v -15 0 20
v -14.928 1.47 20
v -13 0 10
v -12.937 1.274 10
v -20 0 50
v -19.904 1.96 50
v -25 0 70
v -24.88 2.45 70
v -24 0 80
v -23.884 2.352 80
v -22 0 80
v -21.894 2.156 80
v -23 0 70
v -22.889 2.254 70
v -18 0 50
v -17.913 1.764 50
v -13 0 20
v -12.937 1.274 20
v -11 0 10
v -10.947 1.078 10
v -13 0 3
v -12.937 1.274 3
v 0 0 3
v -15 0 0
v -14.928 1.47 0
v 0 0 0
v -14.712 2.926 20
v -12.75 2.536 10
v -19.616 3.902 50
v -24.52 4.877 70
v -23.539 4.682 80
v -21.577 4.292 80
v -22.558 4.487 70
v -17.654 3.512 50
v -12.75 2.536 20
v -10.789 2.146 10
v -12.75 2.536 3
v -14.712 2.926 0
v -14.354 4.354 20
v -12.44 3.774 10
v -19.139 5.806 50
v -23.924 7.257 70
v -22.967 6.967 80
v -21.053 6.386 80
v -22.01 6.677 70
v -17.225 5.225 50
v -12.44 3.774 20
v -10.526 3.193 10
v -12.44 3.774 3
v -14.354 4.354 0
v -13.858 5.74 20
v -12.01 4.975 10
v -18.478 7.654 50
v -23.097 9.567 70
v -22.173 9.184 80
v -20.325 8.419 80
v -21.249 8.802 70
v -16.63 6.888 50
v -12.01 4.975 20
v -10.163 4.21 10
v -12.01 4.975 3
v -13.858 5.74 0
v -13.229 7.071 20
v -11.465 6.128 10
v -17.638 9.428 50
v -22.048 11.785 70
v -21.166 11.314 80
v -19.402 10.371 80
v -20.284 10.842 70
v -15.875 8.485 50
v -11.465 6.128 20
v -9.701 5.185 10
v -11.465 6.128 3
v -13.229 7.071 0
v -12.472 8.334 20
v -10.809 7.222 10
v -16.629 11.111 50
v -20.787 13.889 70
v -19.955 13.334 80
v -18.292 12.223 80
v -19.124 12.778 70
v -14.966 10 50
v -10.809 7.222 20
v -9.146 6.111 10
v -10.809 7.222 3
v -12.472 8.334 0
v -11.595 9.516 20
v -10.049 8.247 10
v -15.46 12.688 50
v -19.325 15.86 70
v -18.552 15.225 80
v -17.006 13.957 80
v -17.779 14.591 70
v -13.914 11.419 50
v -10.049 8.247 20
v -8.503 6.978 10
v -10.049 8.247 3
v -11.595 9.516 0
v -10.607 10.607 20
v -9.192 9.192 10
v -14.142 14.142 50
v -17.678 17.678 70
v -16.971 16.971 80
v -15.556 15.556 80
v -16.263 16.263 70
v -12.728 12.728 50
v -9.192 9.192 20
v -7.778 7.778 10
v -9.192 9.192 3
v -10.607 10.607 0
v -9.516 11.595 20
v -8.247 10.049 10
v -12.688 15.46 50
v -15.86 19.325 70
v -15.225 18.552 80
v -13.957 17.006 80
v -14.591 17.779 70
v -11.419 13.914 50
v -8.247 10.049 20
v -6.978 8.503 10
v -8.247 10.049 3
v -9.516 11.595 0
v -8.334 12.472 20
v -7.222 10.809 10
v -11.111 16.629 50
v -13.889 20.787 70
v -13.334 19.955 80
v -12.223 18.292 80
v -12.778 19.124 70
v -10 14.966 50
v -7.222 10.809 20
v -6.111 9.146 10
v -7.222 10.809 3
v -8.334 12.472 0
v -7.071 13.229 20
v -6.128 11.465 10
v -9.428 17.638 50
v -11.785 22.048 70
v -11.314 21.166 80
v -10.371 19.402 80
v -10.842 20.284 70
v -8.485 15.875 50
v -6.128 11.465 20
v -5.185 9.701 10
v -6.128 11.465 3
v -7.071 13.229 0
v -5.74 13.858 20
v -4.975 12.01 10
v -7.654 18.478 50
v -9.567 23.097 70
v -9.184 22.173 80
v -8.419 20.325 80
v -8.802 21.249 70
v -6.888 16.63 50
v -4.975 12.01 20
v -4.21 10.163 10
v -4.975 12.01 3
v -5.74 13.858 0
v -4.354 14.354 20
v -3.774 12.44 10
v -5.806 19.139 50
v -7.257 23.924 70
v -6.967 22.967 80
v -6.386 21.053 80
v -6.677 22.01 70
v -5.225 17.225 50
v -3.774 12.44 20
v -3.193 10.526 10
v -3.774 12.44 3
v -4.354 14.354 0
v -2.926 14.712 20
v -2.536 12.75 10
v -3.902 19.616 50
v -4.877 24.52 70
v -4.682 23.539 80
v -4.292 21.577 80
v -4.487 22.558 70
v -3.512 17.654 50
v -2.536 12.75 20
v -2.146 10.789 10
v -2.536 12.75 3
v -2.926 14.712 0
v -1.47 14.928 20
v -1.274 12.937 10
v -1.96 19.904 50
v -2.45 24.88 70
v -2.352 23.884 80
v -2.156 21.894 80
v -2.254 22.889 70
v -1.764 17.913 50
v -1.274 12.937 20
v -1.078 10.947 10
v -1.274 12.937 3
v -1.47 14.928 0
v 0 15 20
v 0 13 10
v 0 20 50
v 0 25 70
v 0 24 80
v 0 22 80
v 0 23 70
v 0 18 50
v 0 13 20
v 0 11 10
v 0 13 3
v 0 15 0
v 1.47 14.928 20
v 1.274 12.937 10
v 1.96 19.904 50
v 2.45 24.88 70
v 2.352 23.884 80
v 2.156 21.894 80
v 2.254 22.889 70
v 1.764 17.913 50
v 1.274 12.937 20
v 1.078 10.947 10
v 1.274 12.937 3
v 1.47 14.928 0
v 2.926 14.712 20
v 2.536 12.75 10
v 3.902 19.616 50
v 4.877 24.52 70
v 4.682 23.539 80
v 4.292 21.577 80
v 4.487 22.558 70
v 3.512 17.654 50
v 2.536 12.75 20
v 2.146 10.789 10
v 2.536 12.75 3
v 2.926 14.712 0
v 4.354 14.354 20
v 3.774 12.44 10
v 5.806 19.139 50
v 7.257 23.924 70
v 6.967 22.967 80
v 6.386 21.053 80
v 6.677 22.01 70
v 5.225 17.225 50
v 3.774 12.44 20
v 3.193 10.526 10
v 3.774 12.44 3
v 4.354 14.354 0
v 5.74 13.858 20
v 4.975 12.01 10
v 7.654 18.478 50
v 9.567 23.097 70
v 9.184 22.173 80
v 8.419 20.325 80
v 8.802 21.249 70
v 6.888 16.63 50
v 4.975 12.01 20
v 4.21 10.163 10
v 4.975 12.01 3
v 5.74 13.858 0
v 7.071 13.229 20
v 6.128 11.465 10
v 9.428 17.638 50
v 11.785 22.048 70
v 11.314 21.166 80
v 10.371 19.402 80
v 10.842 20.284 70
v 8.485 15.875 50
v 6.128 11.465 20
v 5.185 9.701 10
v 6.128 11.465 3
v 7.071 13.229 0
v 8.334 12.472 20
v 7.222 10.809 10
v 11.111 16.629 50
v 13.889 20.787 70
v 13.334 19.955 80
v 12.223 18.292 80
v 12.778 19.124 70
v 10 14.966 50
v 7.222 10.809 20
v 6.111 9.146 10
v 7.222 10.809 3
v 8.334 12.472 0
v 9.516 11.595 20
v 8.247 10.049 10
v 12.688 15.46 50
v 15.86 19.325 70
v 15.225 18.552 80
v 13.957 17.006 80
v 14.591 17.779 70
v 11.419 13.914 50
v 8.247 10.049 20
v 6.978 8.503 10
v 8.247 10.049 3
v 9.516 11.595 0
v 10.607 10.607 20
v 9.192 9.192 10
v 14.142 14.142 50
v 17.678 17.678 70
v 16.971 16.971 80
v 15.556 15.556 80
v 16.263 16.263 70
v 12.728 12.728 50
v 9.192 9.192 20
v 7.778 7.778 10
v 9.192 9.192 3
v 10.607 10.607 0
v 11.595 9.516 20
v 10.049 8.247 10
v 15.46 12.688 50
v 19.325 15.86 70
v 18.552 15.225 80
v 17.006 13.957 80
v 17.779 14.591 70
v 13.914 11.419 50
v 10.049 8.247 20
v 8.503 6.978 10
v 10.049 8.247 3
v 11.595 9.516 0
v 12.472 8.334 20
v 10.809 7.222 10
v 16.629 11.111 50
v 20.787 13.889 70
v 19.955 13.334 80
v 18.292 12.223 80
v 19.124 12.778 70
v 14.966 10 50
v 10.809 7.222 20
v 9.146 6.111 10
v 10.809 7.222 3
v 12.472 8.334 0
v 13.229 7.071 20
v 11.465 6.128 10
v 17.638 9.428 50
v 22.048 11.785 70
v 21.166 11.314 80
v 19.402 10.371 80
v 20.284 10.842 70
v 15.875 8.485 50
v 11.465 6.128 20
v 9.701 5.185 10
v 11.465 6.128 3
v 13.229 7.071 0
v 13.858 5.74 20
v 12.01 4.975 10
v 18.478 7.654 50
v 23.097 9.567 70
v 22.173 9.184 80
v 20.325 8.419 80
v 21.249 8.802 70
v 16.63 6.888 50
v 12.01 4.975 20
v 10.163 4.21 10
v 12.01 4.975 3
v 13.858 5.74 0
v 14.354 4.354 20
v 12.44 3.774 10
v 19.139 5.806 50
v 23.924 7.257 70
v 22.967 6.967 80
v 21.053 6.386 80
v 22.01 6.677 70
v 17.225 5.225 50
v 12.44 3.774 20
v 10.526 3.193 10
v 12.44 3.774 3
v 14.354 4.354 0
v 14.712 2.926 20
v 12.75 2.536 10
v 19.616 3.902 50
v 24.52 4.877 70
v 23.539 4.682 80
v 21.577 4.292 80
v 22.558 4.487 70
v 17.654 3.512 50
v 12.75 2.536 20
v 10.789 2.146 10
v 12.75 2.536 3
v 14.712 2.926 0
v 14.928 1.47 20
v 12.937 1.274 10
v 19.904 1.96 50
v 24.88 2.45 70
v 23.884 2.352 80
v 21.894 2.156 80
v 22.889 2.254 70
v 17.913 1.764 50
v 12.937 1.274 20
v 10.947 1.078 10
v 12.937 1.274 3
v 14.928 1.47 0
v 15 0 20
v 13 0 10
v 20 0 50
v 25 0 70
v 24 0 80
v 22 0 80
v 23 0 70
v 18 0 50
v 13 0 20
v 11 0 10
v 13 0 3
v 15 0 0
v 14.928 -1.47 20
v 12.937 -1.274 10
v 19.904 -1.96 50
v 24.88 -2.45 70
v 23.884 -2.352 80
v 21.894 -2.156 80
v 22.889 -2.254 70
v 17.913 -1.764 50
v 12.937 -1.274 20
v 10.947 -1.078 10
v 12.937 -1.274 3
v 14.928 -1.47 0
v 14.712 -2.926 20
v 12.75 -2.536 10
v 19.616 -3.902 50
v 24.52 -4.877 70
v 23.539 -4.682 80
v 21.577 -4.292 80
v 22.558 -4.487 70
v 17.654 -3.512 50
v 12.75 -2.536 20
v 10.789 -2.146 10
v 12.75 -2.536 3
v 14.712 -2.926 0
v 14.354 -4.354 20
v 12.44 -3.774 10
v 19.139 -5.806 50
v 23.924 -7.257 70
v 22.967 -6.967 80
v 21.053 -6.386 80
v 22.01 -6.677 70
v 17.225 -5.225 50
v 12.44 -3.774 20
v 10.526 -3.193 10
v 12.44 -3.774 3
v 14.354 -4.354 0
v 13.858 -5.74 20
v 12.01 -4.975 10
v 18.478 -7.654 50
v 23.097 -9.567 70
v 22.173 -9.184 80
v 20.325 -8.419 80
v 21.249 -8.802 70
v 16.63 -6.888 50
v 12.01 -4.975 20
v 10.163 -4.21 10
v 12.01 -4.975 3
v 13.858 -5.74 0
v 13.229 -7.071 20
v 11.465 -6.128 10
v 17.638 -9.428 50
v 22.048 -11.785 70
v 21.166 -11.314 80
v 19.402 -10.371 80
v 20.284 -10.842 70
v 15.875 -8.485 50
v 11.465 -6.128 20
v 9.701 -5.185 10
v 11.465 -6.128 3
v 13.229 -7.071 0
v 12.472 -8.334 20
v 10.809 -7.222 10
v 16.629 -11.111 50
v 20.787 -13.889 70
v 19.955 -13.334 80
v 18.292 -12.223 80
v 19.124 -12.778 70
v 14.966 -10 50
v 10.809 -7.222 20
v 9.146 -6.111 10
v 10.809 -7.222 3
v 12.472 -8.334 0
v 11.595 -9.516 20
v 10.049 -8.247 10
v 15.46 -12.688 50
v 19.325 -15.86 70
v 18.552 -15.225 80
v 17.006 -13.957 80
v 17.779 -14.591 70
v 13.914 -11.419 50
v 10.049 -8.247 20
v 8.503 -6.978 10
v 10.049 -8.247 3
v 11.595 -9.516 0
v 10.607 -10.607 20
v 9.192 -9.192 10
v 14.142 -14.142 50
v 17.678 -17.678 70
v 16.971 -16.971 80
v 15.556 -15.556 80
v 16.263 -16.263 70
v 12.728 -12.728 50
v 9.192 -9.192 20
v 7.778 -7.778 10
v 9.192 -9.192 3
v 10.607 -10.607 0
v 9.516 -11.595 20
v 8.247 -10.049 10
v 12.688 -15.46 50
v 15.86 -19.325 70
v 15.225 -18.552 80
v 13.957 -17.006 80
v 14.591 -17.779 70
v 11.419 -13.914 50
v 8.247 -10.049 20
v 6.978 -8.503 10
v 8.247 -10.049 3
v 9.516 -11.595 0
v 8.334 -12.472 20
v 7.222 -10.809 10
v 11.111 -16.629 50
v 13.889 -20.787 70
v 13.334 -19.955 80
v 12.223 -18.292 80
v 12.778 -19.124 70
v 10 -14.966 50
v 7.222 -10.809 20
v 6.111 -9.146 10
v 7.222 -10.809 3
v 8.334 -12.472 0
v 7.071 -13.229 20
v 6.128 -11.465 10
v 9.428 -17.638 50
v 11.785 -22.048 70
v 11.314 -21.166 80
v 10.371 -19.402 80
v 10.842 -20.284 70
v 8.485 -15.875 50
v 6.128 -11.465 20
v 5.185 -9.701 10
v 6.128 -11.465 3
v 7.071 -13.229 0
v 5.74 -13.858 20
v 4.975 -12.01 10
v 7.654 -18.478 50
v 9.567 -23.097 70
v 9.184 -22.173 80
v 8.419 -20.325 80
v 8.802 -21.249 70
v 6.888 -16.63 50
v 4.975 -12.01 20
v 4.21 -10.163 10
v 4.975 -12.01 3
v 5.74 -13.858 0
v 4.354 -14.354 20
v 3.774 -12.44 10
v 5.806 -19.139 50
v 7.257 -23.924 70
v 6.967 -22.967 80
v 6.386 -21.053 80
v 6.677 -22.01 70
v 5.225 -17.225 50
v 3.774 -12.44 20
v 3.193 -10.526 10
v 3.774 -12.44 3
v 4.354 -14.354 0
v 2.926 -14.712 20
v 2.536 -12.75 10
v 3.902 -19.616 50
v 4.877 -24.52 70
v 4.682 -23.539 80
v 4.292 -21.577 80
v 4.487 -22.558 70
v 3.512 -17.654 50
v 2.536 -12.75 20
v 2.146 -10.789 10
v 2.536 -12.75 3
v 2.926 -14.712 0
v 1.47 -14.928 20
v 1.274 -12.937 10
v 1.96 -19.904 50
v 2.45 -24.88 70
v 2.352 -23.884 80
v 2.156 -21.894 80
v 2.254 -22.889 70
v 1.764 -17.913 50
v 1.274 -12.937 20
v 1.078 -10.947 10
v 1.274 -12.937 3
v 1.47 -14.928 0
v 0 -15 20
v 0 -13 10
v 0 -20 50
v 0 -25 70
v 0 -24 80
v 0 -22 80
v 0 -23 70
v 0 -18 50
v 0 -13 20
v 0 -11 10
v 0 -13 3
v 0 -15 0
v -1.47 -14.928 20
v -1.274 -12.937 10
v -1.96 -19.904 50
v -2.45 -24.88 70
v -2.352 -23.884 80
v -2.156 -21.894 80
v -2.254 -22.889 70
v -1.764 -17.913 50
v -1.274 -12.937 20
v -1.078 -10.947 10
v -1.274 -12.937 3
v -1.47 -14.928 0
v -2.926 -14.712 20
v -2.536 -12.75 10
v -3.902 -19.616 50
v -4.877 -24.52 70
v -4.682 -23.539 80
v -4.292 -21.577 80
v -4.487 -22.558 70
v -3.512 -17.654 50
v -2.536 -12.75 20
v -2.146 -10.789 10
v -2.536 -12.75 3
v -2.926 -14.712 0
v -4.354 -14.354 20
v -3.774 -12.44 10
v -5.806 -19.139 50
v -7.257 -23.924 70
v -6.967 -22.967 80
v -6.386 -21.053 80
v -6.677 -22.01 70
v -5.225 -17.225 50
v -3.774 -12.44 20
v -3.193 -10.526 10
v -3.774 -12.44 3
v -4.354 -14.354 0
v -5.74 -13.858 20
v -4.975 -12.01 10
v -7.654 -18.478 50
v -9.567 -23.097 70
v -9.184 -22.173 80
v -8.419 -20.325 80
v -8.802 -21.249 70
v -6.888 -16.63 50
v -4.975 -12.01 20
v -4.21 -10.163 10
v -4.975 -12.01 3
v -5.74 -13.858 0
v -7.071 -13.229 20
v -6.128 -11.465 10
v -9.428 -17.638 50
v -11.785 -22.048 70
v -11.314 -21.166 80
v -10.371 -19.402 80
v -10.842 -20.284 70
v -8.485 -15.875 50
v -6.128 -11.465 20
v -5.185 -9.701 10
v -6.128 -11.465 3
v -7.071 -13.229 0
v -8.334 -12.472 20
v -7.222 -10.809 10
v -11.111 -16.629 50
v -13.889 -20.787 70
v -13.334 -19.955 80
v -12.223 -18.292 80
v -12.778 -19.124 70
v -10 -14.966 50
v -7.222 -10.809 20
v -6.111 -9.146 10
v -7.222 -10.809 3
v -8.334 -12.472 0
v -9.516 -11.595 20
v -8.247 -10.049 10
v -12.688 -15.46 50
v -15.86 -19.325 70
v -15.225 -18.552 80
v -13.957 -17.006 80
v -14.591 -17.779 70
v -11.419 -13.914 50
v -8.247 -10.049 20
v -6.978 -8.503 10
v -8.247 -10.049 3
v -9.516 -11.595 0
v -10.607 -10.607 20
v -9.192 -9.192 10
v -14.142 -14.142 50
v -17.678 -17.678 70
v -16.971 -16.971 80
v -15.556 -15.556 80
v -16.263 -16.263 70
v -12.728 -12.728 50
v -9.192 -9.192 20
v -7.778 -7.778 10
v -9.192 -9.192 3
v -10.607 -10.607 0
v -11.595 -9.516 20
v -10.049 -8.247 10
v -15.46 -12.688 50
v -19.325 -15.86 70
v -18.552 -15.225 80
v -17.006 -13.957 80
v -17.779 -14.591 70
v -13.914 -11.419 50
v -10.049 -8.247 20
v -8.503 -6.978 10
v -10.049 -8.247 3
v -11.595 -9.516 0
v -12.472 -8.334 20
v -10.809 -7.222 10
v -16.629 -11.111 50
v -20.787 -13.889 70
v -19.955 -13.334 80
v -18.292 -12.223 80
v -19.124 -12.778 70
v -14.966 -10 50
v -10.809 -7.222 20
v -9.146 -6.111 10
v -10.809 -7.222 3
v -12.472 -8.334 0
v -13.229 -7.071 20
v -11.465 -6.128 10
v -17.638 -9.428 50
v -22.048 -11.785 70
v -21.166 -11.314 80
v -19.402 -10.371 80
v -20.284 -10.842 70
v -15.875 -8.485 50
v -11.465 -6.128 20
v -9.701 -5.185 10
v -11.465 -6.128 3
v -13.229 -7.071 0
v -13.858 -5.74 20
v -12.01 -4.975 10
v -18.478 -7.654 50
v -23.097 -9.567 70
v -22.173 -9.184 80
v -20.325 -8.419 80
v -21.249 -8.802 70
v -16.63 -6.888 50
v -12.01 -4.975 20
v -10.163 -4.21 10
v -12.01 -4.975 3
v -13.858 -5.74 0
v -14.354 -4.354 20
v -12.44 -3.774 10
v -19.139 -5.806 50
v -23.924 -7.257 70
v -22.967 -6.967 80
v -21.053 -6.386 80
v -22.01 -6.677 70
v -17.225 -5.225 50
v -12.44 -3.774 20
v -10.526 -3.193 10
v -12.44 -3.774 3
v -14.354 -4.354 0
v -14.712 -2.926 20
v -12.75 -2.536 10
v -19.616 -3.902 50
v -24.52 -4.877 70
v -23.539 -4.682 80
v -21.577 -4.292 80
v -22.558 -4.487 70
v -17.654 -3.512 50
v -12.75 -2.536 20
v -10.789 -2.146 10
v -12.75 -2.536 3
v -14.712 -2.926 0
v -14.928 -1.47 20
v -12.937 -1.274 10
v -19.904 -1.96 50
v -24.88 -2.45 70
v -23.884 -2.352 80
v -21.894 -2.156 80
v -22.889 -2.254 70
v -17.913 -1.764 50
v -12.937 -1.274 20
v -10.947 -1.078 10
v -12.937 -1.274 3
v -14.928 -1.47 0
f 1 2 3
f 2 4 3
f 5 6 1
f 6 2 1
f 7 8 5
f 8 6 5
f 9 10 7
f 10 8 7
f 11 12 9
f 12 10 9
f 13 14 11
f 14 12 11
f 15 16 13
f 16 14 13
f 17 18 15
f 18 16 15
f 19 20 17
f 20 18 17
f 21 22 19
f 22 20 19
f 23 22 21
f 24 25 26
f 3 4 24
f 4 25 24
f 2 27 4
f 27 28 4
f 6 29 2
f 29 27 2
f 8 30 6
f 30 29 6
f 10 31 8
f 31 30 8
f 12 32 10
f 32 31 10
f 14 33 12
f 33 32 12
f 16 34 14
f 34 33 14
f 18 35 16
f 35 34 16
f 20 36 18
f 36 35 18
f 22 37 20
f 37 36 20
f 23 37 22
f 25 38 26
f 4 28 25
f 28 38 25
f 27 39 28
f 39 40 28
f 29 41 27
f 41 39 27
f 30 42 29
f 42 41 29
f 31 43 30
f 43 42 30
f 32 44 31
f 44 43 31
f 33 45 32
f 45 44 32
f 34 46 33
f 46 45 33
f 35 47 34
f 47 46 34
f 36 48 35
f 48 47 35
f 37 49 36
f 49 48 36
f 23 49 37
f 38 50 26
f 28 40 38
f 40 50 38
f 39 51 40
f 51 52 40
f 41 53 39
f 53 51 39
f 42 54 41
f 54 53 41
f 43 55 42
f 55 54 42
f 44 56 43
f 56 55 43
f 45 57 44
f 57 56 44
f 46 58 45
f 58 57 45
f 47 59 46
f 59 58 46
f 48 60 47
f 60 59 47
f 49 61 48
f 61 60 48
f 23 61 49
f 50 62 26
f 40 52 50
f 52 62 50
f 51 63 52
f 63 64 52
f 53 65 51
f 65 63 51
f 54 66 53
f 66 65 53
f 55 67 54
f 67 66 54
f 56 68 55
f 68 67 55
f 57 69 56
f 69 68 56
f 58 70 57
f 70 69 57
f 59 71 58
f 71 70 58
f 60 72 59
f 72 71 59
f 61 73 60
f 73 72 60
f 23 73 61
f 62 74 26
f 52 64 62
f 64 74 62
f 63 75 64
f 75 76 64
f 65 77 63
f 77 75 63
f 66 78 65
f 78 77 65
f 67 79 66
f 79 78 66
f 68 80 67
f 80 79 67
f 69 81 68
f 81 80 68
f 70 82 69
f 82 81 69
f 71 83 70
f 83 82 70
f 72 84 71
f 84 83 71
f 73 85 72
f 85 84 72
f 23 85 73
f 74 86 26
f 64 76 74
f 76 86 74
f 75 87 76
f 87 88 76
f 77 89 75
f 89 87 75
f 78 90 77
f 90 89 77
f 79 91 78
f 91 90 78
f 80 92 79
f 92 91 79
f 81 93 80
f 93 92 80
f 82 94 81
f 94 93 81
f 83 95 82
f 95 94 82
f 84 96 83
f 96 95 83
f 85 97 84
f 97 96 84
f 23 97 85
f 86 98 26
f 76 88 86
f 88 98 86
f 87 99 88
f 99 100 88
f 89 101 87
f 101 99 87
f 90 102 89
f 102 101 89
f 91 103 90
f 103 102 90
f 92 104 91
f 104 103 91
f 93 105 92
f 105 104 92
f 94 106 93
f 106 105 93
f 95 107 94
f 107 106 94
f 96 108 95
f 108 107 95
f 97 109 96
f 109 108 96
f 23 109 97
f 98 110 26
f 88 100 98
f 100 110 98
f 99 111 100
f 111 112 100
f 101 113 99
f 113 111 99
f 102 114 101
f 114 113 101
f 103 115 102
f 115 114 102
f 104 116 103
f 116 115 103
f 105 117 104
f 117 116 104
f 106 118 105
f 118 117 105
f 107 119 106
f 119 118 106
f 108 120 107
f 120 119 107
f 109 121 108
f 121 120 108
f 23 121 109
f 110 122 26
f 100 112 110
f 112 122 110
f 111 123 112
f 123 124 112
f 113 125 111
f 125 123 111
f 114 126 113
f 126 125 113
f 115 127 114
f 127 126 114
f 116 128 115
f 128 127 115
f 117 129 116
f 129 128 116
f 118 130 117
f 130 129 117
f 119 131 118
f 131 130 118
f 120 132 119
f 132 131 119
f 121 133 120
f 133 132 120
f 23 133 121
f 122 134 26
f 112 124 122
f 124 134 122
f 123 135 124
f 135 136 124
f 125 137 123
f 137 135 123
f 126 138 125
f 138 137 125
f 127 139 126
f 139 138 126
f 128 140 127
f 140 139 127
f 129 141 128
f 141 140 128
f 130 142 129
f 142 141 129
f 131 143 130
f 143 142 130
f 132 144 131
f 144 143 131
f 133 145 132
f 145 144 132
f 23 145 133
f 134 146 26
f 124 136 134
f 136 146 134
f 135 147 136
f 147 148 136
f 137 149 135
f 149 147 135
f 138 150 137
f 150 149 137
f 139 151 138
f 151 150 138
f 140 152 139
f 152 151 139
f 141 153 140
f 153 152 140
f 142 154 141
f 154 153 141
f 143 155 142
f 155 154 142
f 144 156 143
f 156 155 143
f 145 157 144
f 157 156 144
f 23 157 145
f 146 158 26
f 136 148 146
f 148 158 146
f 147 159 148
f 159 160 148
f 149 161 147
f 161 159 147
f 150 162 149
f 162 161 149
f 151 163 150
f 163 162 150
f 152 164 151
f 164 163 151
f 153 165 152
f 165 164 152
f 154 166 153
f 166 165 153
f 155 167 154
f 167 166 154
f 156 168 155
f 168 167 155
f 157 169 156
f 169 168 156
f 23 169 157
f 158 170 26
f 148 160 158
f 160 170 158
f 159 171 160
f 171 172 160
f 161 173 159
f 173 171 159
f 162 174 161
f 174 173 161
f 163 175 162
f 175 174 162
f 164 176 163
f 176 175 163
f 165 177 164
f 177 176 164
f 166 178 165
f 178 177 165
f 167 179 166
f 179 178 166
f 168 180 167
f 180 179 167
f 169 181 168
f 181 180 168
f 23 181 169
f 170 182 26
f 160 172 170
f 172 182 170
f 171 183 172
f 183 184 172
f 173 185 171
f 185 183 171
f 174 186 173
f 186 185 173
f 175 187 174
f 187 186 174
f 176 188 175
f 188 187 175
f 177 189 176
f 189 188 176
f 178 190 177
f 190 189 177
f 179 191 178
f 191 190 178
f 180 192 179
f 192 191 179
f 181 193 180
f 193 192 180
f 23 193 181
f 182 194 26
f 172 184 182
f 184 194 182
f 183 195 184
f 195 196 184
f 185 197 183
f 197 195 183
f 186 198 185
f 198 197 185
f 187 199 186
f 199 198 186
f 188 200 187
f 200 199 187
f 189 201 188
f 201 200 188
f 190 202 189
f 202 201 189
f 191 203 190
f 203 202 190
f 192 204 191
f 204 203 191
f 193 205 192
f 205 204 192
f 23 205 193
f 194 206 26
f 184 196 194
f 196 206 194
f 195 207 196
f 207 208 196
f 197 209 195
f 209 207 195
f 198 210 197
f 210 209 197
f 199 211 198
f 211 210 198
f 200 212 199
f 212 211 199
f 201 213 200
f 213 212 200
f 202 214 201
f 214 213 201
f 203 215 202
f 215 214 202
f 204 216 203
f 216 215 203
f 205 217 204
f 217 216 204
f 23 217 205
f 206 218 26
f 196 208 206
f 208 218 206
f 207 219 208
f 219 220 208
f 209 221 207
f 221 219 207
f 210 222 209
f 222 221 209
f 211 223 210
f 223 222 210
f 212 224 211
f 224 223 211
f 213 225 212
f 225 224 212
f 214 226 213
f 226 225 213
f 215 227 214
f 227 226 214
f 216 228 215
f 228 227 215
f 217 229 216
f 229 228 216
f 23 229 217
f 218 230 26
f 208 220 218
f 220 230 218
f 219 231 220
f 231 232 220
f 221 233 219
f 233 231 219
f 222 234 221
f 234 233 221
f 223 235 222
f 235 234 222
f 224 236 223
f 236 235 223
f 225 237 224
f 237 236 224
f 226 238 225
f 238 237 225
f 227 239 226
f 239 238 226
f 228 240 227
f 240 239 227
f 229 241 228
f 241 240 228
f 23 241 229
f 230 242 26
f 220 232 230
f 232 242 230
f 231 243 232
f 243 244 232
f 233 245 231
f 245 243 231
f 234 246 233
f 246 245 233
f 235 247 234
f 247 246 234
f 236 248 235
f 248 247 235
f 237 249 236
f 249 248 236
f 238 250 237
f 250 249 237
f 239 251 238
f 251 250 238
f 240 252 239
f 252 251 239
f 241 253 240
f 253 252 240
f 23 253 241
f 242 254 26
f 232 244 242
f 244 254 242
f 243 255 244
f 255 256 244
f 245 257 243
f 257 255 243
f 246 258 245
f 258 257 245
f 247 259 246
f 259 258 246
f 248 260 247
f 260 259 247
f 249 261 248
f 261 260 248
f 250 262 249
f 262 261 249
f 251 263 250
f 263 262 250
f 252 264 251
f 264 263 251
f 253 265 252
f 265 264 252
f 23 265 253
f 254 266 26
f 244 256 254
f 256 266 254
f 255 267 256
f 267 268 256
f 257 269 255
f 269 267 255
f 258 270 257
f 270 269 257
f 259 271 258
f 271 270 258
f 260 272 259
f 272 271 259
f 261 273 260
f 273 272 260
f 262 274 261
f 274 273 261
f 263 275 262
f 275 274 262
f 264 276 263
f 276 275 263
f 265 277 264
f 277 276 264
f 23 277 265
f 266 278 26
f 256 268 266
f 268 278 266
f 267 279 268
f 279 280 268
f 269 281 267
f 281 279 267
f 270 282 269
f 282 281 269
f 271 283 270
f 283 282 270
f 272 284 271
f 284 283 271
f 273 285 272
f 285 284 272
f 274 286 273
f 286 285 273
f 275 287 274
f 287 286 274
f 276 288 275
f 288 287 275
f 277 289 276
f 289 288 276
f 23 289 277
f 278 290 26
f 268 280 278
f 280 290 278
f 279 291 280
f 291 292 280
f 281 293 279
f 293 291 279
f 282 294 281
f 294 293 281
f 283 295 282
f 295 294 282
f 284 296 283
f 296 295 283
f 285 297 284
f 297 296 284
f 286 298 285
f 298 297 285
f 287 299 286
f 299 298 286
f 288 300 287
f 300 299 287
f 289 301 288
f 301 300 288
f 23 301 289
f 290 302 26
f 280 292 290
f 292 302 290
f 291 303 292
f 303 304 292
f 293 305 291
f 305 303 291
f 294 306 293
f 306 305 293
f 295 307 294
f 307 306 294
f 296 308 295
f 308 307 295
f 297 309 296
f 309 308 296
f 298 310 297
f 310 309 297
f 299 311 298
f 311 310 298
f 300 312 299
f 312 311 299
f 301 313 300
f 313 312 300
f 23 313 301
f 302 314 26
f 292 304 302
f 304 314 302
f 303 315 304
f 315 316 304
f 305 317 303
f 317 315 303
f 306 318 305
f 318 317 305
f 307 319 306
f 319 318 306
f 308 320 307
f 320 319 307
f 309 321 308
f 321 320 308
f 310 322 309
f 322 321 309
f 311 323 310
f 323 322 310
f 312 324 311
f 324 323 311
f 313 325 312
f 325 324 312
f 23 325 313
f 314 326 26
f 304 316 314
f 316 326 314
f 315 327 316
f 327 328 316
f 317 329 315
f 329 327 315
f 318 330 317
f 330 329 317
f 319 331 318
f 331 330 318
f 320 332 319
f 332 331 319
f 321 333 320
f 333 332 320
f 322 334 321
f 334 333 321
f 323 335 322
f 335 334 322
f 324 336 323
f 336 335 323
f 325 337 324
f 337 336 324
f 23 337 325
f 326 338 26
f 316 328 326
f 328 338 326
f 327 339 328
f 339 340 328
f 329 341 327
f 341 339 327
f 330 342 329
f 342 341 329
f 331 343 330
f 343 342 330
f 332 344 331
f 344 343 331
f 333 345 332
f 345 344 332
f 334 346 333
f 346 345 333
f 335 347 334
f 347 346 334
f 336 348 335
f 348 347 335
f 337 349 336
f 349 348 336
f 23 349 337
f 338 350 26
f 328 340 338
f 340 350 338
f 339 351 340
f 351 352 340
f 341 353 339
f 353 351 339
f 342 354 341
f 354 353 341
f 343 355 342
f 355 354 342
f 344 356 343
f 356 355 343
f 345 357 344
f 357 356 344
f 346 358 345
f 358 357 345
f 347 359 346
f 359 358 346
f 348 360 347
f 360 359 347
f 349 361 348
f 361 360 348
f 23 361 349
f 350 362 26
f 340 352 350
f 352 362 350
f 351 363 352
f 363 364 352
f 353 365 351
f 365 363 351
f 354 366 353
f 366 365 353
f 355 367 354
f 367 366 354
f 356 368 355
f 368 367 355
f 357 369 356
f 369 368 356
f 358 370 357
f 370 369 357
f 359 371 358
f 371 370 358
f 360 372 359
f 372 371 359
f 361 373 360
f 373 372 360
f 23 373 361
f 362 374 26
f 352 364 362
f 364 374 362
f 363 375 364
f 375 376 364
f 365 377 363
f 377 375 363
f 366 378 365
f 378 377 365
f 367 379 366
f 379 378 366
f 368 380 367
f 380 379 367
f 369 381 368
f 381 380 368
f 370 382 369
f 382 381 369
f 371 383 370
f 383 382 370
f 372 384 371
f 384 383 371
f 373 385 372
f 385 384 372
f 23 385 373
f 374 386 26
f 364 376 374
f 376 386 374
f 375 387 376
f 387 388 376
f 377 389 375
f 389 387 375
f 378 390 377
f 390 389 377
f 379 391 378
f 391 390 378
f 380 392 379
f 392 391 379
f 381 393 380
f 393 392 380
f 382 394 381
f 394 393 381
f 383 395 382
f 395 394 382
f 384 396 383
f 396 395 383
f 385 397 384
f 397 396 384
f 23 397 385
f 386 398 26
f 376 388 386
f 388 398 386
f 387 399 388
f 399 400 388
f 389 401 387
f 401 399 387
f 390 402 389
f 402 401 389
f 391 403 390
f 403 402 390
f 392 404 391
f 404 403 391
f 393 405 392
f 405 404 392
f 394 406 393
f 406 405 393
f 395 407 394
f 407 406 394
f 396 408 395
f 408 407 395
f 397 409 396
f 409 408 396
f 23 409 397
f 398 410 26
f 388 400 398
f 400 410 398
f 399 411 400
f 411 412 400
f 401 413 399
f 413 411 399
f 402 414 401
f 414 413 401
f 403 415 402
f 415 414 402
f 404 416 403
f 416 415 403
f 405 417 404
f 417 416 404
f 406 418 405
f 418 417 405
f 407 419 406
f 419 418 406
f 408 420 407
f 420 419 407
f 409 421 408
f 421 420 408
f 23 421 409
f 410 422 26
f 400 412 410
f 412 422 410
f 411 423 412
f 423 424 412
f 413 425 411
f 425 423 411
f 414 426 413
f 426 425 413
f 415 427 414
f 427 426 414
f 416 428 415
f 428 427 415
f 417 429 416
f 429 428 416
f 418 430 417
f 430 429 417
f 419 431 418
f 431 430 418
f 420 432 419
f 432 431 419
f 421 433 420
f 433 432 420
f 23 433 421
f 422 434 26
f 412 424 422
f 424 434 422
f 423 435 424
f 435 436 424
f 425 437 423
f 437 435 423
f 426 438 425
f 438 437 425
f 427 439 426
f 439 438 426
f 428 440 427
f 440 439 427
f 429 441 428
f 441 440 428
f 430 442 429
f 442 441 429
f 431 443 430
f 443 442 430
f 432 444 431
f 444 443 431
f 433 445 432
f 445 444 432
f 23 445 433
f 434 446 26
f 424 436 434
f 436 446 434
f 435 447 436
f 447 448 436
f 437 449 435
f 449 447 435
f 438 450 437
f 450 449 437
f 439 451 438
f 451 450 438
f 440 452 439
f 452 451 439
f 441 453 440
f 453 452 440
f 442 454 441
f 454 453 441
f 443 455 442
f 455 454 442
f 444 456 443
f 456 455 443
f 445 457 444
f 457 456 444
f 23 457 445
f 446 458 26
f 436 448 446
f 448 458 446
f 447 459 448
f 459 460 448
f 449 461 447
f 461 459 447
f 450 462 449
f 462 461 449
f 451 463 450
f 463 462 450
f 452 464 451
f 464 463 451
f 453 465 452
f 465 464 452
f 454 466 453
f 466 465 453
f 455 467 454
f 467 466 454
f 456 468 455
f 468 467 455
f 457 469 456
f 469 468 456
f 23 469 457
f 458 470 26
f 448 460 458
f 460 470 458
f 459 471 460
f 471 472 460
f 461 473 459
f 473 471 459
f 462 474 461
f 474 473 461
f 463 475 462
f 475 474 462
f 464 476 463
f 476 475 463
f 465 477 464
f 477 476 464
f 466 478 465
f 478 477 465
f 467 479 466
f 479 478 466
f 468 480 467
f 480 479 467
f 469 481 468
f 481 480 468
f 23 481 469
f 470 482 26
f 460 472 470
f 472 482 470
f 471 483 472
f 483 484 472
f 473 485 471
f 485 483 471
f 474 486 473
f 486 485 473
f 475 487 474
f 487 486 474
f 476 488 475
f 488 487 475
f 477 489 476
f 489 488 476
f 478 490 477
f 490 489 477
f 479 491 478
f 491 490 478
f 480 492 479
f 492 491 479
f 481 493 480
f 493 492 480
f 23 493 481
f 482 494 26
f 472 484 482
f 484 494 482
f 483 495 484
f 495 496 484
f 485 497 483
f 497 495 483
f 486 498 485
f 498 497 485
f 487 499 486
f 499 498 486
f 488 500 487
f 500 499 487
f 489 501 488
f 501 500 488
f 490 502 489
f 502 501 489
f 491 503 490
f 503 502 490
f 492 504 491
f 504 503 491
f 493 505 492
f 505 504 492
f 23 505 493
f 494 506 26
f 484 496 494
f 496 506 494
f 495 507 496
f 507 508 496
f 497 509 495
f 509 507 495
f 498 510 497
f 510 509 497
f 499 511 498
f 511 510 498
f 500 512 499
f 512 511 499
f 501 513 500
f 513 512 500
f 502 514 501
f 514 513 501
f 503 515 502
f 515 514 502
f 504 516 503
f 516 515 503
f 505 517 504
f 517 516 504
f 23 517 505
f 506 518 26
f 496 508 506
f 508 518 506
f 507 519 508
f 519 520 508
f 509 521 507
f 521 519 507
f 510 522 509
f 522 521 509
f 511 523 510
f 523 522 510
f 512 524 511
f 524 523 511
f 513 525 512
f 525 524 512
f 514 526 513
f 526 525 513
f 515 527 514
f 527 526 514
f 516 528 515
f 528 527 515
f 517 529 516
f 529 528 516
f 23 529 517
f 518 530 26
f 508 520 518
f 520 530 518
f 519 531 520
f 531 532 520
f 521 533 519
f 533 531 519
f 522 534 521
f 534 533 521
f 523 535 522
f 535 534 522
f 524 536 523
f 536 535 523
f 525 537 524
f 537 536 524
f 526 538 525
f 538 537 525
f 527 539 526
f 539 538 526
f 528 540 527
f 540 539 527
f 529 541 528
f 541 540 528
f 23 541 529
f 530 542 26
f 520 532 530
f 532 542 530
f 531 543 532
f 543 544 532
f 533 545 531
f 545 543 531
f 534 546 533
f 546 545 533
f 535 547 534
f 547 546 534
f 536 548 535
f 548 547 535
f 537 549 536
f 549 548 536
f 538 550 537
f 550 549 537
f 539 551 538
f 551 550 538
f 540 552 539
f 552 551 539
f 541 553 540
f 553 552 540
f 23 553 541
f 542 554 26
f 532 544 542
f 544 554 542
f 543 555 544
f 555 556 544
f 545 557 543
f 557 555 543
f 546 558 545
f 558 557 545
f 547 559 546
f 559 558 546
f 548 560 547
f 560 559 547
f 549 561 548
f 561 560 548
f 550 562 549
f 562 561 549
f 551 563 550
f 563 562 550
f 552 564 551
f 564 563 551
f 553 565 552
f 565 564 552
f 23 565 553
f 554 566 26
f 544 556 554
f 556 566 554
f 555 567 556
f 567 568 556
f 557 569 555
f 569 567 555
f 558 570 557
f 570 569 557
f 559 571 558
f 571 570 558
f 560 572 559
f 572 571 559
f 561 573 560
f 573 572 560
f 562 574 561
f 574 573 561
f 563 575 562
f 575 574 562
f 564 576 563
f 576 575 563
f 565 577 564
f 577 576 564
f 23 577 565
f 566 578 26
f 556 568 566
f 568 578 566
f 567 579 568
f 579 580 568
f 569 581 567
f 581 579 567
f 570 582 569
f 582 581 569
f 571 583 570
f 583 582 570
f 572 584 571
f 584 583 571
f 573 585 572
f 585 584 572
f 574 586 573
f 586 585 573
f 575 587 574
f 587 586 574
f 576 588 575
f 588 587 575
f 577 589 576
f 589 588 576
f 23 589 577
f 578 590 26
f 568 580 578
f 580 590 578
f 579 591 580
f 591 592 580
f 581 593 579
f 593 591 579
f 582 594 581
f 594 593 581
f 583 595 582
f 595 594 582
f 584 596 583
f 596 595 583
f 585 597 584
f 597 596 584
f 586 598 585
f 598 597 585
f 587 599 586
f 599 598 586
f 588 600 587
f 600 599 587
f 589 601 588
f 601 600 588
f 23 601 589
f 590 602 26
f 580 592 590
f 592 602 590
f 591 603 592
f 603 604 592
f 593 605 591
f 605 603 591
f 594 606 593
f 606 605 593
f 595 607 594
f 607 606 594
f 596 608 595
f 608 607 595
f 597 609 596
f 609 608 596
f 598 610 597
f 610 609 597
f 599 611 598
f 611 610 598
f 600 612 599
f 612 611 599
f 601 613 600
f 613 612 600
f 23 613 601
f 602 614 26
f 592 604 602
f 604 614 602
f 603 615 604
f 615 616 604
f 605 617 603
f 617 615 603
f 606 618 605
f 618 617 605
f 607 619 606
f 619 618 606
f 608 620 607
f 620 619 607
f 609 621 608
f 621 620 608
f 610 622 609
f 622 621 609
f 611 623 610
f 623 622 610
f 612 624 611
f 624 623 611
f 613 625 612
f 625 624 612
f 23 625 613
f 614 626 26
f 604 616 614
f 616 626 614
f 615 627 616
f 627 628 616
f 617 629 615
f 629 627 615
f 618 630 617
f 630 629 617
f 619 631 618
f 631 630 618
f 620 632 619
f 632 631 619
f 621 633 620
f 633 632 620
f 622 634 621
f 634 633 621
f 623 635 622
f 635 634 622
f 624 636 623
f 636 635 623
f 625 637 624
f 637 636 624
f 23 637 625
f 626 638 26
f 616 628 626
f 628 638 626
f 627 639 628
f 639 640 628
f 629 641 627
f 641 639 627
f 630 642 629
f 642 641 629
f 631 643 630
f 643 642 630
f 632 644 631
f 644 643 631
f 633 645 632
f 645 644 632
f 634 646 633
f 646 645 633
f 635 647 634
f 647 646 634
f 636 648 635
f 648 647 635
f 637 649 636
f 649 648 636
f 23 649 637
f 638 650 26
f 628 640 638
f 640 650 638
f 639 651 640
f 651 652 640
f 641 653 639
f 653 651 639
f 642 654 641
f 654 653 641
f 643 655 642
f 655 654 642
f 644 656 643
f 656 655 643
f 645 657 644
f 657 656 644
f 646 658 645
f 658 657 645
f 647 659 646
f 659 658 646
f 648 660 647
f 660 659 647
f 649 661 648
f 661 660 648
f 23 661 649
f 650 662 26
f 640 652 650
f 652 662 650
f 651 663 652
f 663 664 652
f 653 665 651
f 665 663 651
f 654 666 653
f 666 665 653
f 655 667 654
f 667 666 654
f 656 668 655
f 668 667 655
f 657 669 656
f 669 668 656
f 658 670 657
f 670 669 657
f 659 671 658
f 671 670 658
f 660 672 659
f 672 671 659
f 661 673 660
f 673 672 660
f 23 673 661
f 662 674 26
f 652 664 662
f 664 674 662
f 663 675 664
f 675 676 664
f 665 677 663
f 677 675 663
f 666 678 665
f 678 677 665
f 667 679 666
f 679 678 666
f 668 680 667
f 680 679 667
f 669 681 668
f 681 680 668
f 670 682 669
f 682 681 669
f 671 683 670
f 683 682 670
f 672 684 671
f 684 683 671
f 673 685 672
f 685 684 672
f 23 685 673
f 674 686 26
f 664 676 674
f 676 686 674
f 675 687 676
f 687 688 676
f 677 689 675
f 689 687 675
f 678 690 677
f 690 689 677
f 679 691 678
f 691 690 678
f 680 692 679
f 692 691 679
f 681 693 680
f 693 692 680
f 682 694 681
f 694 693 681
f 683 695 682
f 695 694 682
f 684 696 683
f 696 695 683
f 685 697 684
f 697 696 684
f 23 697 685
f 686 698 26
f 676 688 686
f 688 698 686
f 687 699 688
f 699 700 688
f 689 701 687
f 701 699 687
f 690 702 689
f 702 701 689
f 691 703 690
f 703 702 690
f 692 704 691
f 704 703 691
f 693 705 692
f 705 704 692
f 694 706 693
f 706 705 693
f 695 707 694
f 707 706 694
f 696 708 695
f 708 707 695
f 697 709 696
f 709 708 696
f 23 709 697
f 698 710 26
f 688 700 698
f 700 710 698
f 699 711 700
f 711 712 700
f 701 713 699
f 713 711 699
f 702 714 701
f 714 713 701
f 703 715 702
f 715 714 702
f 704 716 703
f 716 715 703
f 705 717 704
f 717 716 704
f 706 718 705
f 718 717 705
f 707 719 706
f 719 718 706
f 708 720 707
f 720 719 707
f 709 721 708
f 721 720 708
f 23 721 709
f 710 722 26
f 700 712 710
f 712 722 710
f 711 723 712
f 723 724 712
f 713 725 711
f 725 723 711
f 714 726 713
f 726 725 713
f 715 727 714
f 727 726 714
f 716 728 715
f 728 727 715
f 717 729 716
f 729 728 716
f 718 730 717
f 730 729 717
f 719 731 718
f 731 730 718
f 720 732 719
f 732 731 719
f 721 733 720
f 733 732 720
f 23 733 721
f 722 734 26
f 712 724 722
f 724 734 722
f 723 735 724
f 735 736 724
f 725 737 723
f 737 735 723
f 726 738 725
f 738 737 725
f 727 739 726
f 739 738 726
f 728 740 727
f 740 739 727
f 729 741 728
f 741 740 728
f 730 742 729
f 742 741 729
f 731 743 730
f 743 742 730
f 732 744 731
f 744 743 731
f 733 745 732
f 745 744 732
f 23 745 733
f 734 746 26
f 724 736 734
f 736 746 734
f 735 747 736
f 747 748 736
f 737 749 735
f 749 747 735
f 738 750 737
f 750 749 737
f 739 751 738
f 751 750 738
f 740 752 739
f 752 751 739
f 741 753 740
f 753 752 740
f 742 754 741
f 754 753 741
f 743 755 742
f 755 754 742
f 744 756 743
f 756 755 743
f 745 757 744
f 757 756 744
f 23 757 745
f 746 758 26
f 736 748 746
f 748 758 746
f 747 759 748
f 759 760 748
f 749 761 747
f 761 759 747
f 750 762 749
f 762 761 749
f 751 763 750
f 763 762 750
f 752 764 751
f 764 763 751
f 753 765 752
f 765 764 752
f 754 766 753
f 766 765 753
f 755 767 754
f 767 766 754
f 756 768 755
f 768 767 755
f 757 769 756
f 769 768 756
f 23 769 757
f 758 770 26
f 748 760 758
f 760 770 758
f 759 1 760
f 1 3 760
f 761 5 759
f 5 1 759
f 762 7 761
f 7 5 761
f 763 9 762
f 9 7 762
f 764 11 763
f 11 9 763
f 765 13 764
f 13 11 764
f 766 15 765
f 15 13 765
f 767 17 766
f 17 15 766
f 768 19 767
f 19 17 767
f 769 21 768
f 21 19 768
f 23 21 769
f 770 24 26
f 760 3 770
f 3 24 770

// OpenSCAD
// Simple Vase using rotate_extrude

/* [Vase Shape] */
height = 80;          // [40:150]
bottom_radius = 15;   // [10:30]
top_radius = 25;      // [15:50]
wall_thickness = 2;   // [1:4]
$fn = 64;

// Outer profile points
profile = [
    [bottom_radius, 0],
    [bottom_radius - 2, 10],
    [bottom_radius, 20],
    [top_radius - 5, 50],
    [top_radius, height - 10],
    [top_radius - 1, height],
    [top_radius - wall_thickness - 1, height],
    [top_radius - wall_thickness, height - 10],
    [top_radius - wall_thickness - 5, 50],
    [bottom_radius - wall_thickness, 20],
    [bottom_radius - wall_thickness - 2, 10],
    [bottom_radius - wall_thickness, 3],
    [0, 3],
    [0, 0]
];

rotate_extrude($fn=$fn)
    polygon(points=profile);
